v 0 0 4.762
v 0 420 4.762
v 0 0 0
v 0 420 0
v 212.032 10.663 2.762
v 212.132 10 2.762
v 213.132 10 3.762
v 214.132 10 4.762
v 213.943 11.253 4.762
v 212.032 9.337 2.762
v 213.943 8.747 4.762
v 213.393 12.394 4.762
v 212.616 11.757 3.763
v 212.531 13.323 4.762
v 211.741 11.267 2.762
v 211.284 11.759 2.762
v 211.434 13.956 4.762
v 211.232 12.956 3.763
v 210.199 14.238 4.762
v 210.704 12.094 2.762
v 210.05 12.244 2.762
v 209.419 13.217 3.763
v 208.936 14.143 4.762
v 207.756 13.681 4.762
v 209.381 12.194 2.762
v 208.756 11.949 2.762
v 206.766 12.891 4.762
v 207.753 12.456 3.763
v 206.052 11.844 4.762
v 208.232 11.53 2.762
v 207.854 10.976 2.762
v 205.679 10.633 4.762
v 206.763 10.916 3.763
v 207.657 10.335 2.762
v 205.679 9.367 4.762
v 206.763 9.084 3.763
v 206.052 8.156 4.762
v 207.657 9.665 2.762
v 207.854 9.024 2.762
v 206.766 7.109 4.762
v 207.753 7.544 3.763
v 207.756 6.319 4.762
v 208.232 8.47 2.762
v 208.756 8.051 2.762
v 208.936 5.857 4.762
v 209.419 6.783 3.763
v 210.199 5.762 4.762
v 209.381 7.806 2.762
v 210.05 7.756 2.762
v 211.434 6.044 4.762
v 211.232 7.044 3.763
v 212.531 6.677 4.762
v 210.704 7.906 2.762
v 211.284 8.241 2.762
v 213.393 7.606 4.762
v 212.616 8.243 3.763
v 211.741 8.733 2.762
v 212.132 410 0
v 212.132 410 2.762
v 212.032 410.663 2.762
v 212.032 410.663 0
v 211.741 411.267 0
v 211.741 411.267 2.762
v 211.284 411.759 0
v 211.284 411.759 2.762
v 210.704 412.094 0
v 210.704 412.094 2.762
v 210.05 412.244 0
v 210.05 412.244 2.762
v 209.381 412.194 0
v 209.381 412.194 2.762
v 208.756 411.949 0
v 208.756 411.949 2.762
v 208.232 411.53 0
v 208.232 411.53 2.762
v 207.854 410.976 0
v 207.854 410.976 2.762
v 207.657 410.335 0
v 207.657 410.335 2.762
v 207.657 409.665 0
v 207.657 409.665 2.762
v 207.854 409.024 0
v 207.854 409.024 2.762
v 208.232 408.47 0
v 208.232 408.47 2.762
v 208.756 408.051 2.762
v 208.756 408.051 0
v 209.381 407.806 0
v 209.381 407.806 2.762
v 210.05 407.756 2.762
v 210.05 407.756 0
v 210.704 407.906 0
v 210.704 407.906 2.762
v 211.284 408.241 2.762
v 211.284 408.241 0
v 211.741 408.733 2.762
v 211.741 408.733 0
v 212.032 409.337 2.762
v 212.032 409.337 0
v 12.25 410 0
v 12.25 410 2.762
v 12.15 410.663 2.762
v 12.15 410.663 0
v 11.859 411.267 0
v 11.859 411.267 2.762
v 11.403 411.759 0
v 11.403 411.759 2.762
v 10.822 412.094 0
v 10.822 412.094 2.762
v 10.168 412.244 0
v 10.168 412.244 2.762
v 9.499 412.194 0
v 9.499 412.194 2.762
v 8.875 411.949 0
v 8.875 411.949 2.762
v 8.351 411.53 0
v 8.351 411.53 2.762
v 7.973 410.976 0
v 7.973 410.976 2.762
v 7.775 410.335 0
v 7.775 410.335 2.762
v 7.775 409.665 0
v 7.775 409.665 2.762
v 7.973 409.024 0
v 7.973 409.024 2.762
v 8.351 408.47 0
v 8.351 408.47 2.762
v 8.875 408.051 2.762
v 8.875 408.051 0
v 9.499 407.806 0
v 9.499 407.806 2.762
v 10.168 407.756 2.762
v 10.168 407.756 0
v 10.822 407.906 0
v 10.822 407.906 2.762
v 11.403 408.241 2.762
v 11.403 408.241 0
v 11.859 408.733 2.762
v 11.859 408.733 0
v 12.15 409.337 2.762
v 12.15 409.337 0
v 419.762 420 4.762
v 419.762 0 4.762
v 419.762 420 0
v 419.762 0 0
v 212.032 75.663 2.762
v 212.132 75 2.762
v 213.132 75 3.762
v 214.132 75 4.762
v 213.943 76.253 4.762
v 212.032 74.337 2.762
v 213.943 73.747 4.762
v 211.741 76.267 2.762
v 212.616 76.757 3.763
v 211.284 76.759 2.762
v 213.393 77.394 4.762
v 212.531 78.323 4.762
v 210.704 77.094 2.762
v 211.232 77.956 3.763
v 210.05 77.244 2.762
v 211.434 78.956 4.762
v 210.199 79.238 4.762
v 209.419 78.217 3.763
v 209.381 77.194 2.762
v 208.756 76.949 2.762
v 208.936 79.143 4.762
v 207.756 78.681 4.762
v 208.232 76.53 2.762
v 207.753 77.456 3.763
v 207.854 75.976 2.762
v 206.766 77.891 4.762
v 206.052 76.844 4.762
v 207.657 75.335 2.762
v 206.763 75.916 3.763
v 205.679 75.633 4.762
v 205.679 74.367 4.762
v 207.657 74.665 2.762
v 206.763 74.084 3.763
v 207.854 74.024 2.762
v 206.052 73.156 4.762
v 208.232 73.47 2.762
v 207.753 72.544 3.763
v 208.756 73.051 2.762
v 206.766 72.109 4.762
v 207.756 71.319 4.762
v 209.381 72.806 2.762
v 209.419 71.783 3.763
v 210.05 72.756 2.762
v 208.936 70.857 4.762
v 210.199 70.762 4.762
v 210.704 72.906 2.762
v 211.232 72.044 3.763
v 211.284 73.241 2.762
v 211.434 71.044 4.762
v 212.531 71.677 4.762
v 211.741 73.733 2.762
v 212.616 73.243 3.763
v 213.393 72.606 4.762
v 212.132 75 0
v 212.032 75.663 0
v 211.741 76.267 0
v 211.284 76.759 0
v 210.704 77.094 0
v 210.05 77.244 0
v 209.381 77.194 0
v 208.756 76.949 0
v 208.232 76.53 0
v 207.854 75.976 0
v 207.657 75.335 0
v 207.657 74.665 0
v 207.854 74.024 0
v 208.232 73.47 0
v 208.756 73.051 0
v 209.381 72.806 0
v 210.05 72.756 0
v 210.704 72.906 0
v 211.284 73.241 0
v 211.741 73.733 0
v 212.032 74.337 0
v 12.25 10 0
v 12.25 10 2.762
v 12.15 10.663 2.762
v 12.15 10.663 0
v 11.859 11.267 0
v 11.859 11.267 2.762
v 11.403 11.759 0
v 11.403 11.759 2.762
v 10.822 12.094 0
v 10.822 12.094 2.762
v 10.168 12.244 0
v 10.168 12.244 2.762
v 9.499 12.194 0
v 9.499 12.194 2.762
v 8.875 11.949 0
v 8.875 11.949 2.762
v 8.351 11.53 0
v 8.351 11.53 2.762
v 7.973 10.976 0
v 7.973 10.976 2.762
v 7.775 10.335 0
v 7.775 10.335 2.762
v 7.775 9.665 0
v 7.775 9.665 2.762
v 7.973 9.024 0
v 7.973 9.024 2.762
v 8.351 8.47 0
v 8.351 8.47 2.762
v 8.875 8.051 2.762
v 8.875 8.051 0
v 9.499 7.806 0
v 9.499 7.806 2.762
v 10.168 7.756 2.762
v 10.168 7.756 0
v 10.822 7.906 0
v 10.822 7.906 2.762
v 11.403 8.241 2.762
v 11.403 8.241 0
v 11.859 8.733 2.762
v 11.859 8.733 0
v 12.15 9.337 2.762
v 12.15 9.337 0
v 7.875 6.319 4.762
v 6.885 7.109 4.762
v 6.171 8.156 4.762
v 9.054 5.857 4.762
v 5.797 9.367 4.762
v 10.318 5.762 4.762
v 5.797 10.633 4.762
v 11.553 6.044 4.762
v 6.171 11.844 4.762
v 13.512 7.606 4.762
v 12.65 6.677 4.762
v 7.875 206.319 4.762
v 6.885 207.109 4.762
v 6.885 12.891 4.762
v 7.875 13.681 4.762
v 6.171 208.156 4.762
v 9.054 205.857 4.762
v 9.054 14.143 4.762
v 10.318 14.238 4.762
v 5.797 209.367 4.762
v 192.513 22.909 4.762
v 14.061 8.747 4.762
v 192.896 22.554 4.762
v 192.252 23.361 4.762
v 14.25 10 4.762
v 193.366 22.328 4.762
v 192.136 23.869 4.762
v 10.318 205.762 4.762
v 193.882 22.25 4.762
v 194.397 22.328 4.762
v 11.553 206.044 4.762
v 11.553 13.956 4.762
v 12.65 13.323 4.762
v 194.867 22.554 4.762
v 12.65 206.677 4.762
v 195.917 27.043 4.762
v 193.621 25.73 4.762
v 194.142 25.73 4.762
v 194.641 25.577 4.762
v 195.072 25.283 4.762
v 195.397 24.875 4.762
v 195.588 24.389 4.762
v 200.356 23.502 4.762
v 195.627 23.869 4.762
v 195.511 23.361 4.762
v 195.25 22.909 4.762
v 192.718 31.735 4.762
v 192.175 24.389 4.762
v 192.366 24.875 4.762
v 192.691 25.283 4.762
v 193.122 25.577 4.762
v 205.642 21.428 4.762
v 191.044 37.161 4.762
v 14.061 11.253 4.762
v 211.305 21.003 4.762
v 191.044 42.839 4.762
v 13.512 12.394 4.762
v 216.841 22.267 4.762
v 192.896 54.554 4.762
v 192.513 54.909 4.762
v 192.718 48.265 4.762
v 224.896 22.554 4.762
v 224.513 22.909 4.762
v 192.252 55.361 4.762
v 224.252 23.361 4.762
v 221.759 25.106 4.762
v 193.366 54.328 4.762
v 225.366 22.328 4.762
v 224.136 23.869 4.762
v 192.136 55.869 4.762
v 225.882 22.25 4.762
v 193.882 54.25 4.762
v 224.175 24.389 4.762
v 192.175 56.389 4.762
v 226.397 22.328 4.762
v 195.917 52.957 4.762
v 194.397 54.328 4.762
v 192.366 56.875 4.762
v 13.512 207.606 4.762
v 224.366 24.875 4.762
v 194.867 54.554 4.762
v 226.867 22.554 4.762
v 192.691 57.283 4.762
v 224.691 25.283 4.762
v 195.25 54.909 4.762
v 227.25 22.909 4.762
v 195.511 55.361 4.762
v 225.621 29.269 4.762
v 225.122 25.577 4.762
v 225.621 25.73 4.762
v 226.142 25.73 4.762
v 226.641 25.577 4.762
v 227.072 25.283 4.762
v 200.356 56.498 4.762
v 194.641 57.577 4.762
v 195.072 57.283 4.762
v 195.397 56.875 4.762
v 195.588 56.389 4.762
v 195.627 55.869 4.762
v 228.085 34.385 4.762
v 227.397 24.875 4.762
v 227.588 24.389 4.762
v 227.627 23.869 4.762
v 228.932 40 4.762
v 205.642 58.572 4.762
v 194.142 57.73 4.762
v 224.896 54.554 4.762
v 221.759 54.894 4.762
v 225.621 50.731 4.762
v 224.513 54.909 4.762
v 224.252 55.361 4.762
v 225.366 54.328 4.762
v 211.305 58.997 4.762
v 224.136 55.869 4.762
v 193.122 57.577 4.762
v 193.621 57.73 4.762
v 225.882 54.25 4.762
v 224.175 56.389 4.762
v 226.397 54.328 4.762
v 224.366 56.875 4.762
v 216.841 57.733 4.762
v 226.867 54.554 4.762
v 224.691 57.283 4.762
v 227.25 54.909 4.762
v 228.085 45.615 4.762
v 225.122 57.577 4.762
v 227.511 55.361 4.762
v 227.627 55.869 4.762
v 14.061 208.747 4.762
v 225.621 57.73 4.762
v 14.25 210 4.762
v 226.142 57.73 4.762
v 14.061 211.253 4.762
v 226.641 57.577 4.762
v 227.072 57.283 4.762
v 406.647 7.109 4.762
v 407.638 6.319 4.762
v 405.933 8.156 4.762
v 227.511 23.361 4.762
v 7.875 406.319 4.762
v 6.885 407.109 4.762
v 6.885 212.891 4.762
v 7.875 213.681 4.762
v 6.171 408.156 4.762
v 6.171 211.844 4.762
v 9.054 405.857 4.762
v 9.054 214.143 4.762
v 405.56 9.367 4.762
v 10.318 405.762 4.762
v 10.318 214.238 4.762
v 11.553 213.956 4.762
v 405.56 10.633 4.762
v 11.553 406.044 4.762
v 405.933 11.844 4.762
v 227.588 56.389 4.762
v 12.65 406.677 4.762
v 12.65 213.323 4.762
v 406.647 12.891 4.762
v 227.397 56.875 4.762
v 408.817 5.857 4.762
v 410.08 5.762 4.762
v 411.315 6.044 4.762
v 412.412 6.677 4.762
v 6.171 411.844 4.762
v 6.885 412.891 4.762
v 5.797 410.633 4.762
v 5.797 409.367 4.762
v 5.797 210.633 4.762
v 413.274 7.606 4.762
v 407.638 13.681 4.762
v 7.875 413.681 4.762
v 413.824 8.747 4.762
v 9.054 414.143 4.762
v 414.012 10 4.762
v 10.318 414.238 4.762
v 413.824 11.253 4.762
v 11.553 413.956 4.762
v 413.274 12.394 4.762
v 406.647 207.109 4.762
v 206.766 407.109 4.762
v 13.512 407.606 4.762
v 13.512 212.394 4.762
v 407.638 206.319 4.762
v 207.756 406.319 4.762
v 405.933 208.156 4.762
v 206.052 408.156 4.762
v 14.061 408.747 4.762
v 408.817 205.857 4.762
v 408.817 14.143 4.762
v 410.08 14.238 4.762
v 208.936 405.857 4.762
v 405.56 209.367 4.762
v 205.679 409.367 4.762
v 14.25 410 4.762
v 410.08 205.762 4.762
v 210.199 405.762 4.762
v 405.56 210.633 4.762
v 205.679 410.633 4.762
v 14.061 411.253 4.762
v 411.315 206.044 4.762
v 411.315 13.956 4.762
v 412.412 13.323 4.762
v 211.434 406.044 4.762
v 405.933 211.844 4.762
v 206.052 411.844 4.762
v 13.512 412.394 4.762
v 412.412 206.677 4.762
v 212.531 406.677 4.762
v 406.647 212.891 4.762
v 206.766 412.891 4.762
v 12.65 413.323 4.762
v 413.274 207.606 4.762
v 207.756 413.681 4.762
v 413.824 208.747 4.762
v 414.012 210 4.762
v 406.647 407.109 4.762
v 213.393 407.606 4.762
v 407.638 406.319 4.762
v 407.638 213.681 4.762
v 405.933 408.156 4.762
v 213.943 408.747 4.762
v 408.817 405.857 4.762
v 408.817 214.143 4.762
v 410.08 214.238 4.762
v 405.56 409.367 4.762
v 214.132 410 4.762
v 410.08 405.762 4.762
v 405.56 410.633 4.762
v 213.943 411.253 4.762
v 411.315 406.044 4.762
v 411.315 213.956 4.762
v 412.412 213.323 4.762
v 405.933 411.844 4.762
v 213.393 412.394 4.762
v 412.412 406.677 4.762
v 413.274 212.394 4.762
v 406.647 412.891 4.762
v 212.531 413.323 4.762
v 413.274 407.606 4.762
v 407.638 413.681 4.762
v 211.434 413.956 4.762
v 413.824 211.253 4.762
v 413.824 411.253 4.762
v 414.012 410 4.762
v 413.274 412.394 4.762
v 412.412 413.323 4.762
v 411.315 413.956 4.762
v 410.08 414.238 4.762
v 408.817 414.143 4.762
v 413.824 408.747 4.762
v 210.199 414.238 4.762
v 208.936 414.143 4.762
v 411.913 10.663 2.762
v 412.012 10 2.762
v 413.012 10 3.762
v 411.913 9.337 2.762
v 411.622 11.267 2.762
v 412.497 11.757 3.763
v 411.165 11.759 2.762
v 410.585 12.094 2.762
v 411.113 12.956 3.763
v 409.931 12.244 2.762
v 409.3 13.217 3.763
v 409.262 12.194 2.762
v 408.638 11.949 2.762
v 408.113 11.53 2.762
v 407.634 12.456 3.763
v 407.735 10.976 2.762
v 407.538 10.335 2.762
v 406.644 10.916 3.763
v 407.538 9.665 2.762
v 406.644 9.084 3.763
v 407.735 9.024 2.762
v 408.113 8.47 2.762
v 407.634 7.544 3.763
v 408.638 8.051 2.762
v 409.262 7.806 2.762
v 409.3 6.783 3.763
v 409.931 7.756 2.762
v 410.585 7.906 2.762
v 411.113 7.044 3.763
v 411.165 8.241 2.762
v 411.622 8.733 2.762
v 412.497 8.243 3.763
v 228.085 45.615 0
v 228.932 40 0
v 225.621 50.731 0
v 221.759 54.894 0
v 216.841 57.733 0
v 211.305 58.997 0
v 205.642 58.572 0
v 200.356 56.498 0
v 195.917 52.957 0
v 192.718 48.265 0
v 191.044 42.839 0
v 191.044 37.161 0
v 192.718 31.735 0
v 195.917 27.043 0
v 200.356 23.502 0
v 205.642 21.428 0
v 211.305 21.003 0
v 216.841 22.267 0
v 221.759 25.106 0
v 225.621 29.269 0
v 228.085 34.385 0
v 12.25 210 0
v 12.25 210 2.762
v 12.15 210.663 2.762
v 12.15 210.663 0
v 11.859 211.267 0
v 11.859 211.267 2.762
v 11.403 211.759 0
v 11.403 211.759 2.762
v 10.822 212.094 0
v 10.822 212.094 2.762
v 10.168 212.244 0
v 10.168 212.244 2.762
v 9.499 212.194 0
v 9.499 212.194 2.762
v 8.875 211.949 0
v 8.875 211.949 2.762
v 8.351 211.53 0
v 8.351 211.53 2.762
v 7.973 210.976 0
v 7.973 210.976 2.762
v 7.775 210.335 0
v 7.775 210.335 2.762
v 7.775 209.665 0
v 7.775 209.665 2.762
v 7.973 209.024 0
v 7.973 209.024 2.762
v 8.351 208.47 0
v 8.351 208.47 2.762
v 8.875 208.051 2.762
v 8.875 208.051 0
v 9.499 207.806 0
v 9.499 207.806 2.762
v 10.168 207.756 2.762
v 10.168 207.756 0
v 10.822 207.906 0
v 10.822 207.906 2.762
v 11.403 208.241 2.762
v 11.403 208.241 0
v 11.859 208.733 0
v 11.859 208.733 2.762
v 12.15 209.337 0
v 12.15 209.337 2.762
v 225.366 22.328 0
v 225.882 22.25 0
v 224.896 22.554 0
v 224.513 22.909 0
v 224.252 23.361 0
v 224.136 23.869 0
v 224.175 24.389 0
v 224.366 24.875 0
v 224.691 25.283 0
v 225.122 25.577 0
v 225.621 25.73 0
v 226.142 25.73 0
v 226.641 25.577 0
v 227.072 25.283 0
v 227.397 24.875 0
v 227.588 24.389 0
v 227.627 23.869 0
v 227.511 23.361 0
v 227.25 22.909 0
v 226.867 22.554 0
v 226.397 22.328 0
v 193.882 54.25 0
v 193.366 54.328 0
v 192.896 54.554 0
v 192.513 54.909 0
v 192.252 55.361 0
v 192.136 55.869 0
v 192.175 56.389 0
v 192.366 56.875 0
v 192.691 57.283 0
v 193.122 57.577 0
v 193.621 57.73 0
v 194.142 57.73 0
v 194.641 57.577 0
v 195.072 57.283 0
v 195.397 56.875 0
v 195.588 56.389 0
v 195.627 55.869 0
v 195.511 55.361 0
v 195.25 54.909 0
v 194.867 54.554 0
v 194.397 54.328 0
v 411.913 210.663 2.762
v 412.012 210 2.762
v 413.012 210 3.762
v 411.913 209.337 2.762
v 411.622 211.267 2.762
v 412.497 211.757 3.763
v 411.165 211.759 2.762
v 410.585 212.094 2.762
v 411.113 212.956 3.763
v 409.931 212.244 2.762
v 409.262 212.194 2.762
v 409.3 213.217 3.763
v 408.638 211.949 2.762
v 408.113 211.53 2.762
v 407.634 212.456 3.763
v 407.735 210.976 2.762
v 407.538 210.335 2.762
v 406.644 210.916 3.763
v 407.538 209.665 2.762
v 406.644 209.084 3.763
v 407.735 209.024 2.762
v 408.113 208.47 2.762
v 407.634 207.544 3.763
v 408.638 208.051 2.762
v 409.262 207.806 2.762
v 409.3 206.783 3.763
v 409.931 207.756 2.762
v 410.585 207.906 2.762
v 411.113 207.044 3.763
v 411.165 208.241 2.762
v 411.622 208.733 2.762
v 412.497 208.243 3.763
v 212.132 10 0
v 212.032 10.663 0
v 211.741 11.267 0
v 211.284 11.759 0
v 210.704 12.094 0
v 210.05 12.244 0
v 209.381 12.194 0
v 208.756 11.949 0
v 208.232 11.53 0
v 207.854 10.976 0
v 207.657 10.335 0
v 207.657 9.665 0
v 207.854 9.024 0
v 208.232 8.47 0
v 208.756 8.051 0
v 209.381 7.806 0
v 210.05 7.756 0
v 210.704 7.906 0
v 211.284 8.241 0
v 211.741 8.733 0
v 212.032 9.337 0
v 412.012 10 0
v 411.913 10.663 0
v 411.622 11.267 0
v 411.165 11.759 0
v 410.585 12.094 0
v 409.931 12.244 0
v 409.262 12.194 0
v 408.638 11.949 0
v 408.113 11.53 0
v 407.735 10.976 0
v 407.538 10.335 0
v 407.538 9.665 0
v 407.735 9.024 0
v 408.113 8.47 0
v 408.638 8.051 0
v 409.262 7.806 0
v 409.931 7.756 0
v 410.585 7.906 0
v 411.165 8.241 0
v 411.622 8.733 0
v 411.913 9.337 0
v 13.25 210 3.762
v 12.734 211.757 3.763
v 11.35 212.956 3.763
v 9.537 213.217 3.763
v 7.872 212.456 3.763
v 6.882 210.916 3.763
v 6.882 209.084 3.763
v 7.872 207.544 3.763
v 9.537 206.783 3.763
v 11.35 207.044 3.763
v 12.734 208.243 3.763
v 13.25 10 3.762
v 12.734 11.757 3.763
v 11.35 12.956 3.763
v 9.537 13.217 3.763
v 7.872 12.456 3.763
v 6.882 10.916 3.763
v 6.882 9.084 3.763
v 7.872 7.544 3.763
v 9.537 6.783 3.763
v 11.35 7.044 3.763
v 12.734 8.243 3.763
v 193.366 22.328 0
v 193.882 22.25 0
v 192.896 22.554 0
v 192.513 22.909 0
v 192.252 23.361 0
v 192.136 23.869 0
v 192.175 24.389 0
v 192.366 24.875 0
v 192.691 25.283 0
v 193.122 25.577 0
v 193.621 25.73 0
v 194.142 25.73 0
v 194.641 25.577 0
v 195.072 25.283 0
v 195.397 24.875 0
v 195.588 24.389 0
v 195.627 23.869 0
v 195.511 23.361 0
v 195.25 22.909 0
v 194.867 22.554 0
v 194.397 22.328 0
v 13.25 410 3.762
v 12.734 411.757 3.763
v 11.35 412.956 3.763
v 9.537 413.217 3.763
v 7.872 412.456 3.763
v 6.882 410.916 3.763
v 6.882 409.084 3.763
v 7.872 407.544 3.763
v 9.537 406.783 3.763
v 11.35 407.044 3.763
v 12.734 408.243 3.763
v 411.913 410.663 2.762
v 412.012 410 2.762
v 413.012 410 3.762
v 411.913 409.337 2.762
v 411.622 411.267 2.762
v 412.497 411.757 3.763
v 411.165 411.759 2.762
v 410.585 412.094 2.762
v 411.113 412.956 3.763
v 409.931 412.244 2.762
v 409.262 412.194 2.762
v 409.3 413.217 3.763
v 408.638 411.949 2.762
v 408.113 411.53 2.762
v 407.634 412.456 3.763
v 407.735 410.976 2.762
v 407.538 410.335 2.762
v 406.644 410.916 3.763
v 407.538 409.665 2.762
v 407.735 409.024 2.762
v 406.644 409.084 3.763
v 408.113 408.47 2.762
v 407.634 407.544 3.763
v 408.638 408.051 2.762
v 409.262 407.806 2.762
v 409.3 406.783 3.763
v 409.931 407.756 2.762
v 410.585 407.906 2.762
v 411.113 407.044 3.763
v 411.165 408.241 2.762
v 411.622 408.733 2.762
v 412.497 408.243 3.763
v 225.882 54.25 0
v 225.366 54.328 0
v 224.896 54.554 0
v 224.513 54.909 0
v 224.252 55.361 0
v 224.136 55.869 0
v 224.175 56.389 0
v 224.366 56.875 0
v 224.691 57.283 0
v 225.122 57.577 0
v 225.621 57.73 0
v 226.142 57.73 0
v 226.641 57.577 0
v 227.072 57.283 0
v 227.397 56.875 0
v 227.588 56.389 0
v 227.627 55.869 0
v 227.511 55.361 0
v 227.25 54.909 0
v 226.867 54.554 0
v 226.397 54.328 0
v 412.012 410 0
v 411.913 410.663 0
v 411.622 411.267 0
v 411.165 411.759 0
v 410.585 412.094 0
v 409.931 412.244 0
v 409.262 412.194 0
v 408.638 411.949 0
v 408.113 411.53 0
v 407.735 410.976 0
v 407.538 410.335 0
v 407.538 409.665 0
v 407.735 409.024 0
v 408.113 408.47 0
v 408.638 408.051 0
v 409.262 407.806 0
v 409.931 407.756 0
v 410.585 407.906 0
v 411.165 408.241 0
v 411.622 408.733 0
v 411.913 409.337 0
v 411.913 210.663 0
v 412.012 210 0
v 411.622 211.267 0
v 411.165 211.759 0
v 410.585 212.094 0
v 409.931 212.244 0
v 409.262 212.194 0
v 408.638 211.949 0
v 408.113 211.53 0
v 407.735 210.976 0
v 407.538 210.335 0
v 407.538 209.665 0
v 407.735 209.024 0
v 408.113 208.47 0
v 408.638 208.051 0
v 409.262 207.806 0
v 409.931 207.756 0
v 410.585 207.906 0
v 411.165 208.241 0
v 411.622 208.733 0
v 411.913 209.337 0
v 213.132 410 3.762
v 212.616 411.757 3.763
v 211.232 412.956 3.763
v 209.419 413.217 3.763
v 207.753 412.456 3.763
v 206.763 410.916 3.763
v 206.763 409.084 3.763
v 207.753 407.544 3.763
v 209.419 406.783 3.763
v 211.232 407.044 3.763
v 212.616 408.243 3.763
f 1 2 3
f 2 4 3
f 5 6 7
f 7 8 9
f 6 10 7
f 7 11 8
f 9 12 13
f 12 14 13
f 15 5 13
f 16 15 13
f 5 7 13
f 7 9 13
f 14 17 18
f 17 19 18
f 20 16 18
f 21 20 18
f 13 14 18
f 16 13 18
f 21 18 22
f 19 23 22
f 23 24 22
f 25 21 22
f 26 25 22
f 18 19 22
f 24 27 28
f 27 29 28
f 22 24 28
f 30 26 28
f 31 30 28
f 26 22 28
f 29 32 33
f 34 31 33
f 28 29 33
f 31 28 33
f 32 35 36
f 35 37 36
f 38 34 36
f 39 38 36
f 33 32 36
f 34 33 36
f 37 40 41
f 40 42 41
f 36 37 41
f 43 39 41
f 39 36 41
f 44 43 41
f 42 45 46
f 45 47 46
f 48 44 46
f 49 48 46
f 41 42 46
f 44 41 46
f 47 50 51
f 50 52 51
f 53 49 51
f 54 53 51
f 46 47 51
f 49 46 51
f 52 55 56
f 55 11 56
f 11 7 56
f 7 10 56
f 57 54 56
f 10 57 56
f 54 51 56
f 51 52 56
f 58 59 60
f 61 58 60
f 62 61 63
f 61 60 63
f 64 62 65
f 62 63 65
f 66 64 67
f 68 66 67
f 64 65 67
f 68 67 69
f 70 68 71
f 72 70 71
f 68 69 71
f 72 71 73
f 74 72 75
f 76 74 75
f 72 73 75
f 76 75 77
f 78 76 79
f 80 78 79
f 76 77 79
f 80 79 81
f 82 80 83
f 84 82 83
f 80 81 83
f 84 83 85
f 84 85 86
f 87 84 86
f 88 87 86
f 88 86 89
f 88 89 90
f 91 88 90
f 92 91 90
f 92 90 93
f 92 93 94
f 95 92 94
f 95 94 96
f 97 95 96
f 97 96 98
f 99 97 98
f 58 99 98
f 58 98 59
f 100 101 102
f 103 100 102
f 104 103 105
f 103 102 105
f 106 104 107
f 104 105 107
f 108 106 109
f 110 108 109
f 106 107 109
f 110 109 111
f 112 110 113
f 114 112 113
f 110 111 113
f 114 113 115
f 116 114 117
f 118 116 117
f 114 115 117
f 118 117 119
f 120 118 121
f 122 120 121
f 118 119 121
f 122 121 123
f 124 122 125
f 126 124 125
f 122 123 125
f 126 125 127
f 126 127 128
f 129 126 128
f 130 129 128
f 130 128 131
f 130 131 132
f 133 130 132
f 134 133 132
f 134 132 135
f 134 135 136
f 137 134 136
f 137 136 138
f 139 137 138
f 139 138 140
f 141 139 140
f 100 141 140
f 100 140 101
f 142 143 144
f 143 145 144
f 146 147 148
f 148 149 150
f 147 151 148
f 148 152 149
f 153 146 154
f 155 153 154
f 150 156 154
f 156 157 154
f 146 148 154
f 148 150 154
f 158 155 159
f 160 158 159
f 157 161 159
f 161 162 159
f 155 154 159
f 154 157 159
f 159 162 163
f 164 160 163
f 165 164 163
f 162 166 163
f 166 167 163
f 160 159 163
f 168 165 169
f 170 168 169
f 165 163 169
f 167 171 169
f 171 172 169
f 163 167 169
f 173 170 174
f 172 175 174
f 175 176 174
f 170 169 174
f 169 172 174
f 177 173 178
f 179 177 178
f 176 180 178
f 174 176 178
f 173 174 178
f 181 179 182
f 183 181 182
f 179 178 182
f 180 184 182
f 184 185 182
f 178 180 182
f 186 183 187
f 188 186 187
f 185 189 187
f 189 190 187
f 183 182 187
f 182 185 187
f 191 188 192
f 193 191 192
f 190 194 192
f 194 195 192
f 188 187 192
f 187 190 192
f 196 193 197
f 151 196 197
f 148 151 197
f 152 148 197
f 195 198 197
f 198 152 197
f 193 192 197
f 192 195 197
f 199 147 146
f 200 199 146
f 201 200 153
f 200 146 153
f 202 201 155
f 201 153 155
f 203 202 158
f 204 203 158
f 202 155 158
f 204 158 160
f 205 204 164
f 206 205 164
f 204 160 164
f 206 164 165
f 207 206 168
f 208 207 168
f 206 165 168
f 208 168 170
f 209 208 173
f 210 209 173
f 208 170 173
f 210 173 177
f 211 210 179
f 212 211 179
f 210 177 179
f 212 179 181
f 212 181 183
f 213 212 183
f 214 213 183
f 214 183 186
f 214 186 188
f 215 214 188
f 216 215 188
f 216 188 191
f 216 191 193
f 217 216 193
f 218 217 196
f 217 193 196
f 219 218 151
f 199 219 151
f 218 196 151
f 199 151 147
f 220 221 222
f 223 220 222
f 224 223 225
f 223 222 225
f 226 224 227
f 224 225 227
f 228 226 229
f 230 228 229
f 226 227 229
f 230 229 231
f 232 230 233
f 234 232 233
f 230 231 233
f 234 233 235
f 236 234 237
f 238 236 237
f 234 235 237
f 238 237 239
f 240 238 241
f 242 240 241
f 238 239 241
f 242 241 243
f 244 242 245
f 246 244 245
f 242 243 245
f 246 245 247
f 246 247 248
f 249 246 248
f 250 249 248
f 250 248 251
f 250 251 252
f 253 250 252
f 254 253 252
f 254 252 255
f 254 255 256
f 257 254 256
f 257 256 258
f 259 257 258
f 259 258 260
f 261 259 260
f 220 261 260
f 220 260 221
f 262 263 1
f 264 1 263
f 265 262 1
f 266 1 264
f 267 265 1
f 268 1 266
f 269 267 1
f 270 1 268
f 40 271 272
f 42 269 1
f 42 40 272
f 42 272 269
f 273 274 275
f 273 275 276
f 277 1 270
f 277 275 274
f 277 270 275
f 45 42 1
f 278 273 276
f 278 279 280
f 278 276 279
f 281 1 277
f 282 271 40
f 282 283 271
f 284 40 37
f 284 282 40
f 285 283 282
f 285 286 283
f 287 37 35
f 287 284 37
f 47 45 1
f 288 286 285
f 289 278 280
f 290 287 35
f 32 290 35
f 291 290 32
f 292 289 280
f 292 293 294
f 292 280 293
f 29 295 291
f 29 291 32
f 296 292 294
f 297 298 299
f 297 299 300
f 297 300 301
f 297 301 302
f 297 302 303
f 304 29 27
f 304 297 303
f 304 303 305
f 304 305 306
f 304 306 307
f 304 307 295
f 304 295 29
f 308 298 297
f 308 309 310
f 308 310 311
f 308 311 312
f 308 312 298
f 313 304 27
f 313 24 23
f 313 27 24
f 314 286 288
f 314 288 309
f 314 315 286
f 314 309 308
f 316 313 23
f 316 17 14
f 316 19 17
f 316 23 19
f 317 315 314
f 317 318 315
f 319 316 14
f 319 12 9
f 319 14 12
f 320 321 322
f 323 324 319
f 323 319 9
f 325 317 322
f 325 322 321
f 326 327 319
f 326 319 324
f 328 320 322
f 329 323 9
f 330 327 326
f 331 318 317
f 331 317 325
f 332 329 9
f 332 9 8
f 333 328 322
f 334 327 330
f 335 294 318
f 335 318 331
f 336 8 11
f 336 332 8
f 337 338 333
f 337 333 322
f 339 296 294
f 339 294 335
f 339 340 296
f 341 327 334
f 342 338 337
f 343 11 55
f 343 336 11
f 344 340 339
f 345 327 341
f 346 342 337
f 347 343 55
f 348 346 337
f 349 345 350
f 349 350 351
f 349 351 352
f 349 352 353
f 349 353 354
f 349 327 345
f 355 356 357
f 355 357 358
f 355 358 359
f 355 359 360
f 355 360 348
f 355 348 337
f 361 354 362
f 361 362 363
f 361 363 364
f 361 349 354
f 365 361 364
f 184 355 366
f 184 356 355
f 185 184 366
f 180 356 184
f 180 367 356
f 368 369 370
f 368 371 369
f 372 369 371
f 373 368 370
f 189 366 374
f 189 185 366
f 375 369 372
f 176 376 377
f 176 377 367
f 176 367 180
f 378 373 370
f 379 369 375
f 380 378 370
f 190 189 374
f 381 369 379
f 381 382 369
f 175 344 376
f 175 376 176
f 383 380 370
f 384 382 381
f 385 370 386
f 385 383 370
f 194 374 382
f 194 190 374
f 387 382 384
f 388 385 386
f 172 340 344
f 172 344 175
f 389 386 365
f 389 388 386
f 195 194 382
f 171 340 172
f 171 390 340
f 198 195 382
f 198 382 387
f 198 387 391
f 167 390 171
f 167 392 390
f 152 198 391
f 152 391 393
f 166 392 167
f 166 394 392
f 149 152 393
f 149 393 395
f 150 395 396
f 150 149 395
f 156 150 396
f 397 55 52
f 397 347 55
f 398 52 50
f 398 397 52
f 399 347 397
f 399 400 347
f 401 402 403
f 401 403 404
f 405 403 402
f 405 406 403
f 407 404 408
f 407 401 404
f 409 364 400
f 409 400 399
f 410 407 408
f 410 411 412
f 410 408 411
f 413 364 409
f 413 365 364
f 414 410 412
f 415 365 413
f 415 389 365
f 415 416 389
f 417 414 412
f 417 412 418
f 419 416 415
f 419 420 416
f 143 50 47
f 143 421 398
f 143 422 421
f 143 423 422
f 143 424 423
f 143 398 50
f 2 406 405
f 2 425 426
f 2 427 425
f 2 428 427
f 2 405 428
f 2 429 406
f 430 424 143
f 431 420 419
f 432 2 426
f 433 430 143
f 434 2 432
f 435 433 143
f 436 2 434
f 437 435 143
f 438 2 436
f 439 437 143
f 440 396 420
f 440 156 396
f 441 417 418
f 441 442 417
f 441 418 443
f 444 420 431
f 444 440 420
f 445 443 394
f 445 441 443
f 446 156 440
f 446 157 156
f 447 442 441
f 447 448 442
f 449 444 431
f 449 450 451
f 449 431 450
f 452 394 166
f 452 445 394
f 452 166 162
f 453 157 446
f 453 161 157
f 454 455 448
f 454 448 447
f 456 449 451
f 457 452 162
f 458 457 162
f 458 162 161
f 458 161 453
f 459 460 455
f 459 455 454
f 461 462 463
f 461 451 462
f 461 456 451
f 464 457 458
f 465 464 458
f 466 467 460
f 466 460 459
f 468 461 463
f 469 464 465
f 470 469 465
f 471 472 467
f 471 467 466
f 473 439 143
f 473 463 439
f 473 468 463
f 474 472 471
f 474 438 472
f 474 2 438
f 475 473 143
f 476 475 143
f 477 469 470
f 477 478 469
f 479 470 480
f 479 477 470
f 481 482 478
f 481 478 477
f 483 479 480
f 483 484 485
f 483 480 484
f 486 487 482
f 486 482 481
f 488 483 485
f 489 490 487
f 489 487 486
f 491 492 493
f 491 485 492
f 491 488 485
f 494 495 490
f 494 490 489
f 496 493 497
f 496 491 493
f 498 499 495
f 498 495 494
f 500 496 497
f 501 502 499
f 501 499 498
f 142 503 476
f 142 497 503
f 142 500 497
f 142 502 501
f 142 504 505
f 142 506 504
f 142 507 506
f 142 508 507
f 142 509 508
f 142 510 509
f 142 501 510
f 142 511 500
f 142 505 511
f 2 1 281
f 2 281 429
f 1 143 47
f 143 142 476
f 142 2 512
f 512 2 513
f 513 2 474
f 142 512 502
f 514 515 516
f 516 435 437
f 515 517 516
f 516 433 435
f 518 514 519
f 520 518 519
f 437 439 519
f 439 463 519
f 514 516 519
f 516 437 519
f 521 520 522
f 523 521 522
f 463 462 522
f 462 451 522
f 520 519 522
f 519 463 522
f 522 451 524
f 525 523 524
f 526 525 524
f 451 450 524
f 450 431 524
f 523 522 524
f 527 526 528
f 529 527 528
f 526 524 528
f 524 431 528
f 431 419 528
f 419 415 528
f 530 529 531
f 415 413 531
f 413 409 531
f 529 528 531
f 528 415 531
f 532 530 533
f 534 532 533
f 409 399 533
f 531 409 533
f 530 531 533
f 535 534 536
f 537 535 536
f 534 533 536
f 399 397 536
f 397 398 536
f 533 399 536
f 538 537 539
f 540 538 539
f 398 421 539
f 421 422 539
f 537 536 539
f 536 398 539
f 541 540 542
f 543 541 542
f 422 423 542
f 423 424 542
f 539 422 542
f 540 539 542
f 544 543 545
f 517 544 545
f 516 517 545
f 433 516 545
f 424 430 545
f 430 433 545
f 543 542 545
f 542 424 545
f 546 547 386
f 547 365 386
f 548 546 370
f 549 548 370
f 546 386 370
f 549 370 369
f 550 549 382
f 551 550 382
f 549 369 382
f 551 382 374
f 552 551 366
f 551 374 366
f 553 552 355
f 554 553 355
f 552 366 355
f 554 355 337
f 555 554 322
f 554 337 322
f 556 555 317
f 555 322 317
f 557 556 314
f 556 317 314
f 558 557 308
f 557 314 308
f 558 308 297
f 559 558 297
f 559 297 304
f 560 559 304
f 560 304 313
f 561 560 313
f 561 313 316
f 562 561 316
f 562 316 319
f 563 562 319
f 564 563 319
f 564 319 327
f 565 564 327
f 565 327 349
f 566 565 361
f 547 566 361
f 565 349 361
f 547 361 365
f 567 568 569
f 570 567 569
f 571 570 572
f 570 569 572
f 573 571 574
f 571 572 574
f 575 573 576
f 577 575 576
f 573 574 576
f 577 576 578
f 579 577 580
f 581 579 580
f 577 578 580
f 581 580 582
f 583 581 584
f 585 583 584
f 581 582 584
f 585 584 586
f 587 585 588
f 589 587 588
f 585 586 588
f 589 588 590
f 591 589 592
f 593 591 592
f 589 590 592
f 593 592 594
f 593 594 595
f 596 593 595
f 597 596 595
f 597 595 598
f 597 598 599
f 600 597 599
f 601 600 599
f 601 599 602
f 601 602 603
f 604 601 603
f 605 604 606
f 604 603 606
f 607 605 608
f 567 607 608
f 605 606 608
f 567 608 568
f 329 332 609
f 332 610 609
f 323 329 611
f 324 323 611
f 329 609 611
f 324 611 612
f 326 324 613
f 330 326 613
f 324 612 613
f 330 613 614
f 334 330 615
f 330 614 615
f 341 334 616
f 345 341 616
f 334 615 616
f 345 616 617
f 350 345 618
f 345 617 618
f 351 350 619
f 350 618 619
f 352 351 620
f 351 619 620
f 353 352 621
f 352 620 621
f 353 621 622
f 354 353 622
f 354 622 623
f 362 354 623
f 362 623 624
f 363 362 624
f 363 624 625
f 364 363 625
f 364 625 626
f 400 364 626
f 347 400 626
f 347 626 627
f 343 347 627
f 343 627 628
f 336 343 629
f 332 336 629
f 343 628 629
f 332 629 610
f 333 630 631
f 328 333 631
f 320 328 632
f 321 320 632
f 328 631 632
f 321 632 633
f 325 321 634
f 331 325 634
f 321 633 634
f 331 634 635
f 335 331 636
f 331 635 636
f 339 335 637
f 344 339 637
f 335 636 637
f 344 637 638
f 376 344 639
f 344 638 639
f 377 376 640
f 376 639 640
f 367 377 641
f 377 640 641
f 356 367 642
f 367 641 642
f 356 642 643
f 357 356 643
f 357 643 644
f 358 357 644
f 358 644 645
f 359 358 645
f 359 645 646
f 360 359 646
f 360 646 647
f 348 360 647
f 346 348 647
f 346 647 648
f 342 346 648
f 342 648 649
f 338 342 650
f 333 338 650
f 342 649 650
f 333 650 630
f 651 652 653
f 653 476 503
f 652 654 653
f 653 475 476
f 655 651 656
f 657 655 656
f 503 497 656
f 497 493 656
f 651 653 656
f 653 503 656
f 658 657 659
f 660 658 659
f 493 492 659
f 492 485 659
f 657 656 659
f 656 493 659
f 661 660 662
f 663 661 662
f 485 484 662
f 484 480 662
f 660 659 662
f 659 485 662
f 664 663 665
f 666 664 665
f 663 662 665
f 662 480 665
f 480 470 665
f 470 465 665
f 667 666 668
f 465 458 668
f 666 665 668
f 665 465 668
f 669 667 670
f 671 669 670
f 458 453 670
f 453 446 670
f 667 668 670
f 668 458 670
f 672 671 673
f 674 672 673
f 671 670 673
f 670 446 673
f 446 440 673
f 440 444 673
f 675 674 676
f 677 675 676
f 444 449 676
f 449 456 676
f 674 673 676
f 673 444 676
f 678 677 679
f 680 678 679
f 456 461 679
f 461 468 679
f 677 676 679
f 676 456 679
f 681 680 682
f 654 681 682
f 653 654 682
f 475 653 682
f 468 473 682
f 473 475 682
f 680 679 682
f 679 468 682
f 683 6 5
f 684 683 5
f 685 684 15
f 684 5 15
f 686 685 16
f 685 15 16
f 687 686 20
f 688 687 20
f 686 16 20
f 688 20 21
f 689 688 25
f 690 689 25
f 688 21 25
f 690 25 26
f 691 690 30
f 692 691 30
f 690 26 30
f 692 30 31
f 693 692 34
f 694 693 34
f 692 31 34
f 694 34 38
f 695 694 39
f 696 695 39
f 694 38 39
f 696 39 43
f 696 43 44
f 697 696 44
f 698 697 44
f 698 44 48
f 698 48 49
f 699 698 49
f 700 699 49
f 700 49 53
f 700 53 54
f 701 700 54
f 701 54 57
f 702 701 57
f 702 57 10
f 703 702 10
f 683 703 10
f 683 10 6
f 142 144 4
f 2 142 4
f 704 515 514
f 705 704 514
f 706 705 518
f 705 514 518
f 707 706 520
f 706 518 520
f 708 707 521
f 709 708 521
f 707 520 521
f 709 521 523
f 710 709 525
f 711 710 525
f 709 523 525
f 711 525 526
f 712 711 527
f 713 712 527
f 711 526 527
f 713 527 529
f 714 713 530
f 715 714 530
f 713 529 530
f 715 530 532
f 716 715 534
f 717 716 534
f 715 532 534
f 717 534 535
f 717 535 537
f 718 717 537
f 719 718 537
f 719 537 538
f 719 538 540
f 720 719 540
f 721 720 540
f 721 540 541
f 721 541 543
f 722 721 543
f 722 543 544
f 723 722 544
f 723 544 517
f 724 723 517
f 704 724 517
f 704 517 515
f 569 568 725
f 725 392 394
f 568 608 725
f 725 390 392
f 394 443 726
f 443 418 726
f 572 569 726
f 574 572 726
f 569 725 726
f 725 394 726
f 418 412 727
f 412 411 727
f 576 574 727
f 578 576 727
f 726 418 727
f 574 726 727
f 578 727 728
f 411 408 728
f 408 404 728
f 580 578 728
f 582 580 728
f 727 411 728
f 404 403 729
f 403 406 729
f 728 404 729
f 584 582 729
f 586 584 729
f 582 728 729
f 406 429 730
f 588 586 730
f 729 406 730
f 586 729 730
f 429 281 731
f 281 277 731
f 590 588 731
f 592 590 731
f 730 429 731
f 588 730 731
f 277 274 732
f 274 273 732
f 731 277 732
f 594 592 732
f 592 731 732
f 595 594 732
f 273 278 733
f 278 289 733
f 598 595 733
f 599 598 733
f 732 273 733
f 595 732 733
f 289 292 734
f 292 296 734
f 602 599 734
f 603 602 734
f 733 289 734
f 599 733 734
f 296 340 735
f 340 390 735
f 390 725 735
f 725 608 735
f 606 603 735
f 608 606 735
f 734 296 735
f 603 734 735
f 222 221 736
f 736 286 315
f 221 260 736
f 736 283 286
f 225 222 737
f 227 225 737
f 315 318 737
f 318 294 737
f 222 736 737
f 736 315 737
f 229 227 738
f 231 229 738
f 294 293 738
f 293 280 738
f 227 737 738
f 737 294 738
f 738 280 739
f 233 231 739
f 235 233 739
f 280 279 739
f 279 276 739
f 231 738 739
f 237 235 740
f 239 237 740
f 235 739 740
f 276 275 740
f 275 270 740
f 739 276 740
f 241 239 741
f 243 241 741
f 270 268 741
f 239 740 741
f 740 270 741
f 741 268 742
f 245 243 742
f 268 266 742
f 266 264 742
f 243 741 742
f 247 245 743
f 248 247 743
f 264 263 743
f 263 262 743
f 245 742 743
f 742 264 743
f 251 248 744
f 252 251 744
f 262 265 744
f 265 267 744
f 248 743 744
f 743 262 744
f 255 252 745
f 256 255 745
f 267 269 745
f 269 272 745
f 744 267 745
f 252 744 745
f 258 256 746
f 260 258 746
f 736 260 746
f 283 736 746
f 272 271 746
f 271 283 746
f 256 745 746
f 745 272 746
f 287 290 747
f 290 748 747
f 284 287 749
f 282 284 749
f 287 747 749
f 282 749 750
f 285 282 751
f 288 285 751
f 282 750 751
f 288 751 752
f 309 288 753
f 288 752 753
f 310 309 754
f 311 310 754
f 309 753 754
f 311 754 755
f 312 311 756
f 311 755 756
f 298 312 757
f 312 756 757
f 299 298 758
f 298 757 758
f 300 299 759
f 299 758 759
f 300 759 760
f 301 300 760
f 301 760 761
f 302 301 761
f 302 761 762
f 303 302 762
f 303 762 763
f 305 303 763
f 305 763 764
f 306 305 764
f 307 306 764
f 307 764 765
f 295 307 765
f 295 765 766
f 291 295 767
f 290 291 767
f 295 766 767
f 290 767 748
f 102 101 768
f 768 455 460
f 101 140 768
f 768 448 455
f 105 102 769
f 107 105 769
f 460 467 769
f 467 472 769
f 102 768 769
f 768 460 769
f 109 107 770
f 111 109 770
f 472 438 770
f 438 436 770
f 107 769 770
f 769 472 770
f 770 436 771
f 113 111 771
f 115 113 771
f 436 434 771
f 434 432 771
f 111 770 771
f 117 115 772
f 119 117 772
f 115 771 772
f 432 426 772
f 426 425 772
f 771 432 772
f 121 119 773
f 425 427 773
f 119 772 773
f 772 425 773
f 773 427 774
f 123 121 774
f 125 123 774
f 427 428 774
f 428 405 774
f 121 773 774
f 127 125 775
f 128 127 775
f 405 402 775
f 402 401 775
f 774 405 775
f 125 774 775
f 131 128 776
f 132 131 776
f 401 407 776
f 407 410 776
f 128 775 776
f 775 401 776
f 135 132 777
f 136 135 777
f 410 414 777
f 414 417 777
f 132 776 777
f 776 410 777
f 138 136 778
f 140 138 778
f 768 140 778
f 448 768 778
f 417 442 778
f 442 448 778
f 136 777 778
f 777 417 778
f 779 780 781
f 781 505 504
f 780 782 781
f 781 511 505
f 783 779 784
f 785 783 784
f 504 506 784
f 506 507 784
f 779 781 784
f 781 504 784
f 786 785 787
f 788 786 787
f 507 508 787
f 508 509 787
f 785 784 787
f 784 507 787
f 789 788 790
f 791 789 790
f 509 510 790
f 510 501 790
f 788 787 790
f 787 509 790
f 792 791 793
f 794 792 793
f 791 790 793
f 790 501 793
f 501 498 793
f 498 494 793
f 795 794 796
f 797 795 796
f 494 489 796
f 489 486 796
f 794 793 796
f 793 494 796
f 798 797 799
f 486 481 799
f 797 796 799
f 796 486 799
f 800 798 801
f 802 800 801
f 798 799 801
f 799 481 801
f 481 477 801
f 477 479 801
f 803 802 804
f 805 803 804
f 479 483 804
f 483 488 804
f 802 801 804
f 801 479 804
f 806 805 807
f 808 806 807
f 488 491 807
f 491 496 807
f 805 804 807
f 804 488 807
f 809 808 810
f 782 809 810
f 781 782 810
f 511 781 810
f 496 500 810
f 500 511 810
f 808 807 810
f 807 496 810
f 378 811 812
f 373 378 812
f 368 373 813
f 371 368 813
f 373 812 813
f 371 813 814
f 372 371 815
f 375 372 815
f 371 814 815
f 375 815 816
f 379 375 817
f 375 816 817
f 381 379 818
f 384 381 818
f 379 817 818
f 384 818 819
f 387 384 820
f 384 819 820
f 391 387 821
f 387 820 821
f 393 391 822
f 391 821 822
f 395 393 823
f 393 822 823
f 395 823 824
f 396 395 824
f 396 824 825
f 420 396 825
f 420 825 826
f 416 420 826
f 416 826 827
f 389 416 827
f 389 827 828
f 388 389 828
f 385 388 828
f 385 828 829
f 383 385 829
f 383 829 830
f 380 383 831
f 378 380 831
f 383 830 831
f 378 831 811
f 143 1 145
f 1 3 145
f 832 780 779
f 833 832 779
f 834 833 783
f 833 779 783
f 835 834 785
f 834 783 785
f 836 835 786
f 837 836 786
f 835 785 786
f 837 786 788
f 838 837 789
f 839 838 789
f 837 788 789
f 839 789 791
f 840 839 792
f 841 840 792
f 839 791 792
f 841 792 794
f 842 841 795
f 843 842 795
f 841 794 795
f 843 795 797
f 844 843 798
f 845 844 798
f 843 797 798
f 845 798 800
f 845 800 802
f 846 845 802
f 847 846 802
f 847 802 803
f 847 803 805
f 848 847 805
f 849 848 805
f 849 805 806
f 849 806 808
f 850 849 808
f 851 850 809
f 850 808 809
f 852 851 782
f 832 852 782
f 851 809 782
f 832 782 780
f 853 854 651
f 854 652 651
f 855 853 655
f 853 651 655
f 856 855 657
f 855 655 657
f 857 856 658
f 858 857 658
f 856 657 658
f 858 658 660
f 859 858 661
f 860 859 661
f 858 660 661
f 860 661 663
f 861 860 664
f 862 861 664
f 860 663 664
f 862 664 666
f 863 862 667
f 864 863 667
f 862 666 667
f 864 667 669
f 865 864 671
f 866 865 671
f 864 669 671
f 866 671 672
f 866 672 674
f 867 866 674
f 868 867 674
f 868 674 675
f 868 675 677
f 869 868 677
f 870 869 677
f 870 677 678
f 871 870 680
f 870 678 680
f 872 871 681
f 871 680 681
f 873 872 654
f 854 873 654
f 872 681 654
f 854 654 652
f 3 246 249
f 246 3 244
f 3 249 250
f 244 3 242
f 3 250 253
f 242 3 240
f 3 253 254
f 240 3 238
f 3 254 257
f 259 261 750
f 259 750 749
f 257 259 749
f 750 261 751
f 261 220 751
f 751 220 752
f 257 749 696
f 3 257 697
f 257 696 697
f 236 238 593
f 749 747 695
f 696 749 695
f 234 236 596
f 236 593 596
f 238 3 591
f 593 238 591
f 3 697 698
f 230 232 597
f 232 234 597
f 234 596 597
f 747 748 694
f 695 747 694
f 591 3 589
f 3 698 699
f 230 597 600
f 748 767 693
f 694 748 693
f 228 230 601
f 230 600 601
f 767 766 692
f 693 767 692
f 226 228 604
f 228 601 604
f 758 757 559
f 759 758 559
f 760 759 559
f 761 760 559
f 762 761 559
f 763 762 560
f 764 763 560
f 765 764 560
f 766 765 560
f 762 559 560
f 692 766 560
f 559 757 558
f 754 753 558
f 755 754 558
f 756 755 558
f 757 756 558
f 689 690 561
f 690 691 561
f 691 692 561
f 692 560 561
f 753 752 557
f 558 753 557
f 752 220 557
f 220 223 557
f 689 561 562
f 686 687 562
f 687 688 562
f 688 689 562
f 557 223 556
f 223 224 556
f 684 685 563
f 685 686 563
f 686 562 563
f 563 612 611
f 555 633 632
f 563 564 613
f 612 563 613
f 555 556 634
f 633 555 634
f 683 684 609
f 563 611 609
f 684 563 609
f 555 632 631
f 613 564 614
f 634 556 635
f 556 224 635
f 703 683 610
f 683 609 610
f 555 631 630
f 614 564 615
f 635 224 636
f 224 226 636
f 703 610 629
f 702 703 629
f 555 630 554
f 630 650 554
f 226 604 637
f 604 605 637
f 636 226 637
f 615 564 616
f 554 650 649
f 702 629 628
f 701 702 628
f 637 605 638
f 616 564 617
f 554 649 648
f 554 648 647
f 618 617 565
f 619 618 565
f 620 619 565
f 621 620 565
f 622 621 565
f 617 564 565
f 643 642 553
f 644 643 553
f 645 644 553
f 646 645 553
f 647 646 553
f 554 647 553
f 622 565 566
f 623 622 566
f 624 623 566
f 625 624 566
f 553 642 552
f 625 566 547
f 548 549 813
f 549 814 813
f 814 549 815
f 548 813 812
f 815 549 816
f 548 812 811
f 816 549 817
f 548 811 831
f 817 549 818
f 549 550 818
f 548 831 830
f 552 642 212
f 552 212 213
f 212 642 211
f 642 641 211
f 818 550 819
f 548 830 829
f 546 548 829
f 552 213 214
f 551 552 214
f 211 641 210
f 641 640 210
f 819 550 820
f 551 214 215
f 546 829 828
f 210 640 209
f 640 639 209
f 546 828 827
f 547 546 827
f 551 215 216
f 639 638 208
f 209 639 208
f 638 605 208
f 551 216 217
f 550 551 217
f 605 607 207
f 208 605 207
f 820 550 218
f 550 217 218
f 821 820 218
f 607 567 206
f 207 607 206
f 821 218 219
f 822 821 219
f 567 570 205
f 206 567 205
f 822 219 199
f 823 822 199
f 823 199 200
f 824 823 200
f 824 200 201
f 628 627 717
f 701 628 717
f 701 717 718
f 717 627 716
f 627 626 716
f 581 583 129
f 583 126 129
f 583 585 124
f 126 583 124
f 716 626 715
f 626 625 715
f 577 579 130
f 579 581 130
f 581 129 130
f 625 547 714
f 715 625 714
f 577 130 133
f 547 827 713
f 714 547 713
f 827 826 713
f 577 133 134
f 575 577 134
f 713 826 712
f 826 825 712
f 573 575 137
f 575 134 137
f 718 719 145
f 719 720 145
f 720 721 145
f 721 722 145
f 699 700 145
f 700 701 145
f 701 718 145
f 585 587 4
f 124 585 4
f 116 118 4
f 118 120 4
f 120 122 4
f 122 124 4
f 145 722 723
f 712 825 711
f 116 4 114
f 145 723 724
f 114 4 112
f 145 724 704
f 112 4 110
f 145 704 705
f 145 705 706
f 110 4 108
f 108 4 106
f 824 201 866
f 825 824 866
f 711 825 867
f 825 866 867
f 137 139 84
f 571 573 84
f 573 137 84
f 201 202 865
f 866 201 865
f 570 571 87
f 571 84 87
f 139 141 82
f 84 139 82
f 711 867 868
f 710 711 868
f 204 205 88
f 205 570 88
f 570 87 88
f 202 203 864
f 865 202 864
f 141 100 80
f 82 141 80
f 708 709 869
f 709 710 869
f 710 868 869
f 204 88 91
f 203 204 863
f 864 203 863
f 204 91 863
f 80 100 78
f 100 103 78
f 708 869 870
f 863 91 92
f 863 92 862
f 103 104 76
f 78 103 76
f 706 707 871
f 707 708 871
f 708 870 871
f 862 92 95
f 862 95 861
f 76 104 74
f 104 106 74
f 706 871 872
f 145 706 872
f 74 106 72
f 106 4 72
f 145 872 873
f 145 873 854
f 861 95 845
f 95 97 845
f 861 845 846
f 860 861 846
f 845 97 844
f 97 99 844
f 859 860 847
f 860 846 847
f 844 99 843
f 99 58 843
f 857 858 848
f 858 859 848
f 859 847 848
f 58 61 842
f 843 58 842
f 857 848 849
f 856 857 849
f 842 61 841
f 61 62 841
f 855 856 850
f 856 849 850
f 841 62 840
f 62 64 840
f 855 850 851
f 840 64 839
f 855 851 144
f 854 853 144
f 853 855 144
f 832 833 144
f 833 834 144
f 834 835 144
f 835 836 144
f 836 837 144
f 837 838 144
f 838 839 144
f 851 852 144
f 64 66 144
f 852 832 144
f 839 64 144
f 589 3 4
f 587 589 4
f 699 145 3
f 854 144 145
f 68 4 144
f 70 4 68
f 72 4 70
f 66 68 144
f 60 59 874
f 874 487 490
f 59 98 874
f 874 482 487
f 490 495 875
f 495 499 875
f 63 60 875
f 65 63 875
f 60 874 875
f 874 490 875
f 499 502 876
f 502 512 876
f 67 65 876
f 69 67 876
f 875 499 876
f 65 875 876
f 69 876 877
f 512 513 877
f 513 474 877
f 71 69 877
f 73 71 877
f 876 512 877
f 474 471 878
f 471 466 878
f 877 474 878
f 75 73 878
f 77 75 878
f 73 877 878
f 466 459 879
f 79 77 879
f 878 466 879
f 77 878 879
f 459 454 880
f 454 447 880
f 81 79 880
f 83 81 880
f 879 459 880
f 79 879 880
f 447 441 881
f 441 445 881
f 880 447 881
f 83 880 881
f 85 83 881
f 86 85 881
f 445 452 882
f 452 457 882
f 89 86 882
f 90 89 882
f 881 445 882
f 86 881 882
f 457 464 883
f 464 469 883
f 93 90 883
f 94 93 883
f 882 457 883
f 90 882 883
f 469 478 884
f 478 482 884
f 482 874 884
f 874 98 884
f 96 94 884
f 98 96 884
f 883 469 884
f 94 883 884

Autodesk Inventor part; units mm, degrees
ref_plane "YZ Plane" through (0, 0, 0) normal (1, 0, 0) x (0, 1, 0)
ref_plane "XZ Plane" through (0, 0, 0) normal (0, 1, 0) x (-1, 0, 0)
ref_plane "XY Plane" through (0, 0, 0) normal (0, 0, 1) x (1, 0, 0)
sketch "Sketch1" plane through (0, 0, 0) normal (0, 0, 1) x (1, 0, 0)
  line L0 (0, 0) -> (419.7625, 0)
  line L1 (419.7625, 0) -> (419.7625, 420)
  line L2 (419.7625, 420) -> (0, 420)
  line L3 (0, 420) -> (0, 0)
  dimension "d0" = 419.7625
  dimension "d1" = 420
extrude "Extrusion1" add sketch "Sketch1" along normal blind 4.7625
sketch "Sketch3" plane through (0, 0, 4.7625) normal (0, 0, 1) x (1, 0, 0)
  line L0 (0, 0) -> (419.7625, 0) projected
  line L1 (0, 420) -> (0, 0) projected
  circle A0 centre (209.8815, 40) radius 19.05
  dimension "d13" = 38.1
  dimension "d14" = 209.8815
  dimension "d30" = 40
extrude "Extrusion2" cut sketch "Sketch3" against normal up to next
sketch "Sketch5" plane through (0, 0, 4.7625) normal (0, 0, 1) x (1, 0, 0)
  circle A0 centre (209.8815, 40) radius 19.05 projected
  point P0 (193.8815, 56)
  point P1 (225.8815, 56)
  point P2 (193.8815, 24)
  point P3 (225.8815, 24)
  dimension "d31" = 32
  dimension "d32" = 32
  dimension "d33" = 16
  dimension "d34" = 16
hole "Hole2" at (193.8815, 56, 4.7625) at (225.8815, 56, 4.7625) at (193.8815, 24, 4.7625) at (225.8815, 24, 4.7625) direction (0, 0, -1) diameter 3.5 end through all
sketch "Sketch6" plane through (0, 0, 4.7625) normal (0, 0, 1) x (1, 0, 0)
  line L0 (0, 0) -> (419.7625, 0) projected
  line L1 (419.7625, 0) -> (419.7625, 420) projected
  line L2 (419.7625, 420) -> (0, 420) projected
  line L3 (0, 420) -> (0, 0) projected
  circle A0 centre (10, 410) radius 2.25
  circle A1 centre (409.7625, 410) radius 2.25
  circle A2 centre (10, 10) radius 2.25
  circle A3 centre (409.7625, 10) radius 2.25
  circle A4 centre (10, 210) radius 2.25
  circle A5 centre (409.7625, 210) radius 2.25
  circle A6 centre (209.8815, 410) radius 2.25
  circle A7 centre (209.8815, 10) radius 2.25
  circle A8 centre (209.8815, 75) radius 2.25
  dimension "d42" = 4.5
  dimension "d43" = 10
  dimension "d44" = 10
  dimension "d45" = 10
  dimension "d46" = 10
  dimension "d47" = 10
  dimension "d48" = 210
  dimension "d51" = 209.8815
  dimension "d55" = 75
extrude "Extrusion3" cut sketch "Sketch6" against normal up to next contours A0 | A1 | A2 | A3 | A4 | A5 | A6 | A7 | A8
chamfer "Chamfer1" distance 2 angle 45 9 edges at (7.75, 410, 4.7625) (207.6315, 410, 4.7625) (407.5125, 410, 4.7625) (407.5125, 210, 4.7625) (7.75, 210, 4.7625) (7.75, 10, 4.7625) (207.6315, 10, 4.7625) (407.5125, 10, 4.7625) (207.6315, 75, 4.7625)
properties part number "EnclosurePanelSide" material "ABS Plastic"
